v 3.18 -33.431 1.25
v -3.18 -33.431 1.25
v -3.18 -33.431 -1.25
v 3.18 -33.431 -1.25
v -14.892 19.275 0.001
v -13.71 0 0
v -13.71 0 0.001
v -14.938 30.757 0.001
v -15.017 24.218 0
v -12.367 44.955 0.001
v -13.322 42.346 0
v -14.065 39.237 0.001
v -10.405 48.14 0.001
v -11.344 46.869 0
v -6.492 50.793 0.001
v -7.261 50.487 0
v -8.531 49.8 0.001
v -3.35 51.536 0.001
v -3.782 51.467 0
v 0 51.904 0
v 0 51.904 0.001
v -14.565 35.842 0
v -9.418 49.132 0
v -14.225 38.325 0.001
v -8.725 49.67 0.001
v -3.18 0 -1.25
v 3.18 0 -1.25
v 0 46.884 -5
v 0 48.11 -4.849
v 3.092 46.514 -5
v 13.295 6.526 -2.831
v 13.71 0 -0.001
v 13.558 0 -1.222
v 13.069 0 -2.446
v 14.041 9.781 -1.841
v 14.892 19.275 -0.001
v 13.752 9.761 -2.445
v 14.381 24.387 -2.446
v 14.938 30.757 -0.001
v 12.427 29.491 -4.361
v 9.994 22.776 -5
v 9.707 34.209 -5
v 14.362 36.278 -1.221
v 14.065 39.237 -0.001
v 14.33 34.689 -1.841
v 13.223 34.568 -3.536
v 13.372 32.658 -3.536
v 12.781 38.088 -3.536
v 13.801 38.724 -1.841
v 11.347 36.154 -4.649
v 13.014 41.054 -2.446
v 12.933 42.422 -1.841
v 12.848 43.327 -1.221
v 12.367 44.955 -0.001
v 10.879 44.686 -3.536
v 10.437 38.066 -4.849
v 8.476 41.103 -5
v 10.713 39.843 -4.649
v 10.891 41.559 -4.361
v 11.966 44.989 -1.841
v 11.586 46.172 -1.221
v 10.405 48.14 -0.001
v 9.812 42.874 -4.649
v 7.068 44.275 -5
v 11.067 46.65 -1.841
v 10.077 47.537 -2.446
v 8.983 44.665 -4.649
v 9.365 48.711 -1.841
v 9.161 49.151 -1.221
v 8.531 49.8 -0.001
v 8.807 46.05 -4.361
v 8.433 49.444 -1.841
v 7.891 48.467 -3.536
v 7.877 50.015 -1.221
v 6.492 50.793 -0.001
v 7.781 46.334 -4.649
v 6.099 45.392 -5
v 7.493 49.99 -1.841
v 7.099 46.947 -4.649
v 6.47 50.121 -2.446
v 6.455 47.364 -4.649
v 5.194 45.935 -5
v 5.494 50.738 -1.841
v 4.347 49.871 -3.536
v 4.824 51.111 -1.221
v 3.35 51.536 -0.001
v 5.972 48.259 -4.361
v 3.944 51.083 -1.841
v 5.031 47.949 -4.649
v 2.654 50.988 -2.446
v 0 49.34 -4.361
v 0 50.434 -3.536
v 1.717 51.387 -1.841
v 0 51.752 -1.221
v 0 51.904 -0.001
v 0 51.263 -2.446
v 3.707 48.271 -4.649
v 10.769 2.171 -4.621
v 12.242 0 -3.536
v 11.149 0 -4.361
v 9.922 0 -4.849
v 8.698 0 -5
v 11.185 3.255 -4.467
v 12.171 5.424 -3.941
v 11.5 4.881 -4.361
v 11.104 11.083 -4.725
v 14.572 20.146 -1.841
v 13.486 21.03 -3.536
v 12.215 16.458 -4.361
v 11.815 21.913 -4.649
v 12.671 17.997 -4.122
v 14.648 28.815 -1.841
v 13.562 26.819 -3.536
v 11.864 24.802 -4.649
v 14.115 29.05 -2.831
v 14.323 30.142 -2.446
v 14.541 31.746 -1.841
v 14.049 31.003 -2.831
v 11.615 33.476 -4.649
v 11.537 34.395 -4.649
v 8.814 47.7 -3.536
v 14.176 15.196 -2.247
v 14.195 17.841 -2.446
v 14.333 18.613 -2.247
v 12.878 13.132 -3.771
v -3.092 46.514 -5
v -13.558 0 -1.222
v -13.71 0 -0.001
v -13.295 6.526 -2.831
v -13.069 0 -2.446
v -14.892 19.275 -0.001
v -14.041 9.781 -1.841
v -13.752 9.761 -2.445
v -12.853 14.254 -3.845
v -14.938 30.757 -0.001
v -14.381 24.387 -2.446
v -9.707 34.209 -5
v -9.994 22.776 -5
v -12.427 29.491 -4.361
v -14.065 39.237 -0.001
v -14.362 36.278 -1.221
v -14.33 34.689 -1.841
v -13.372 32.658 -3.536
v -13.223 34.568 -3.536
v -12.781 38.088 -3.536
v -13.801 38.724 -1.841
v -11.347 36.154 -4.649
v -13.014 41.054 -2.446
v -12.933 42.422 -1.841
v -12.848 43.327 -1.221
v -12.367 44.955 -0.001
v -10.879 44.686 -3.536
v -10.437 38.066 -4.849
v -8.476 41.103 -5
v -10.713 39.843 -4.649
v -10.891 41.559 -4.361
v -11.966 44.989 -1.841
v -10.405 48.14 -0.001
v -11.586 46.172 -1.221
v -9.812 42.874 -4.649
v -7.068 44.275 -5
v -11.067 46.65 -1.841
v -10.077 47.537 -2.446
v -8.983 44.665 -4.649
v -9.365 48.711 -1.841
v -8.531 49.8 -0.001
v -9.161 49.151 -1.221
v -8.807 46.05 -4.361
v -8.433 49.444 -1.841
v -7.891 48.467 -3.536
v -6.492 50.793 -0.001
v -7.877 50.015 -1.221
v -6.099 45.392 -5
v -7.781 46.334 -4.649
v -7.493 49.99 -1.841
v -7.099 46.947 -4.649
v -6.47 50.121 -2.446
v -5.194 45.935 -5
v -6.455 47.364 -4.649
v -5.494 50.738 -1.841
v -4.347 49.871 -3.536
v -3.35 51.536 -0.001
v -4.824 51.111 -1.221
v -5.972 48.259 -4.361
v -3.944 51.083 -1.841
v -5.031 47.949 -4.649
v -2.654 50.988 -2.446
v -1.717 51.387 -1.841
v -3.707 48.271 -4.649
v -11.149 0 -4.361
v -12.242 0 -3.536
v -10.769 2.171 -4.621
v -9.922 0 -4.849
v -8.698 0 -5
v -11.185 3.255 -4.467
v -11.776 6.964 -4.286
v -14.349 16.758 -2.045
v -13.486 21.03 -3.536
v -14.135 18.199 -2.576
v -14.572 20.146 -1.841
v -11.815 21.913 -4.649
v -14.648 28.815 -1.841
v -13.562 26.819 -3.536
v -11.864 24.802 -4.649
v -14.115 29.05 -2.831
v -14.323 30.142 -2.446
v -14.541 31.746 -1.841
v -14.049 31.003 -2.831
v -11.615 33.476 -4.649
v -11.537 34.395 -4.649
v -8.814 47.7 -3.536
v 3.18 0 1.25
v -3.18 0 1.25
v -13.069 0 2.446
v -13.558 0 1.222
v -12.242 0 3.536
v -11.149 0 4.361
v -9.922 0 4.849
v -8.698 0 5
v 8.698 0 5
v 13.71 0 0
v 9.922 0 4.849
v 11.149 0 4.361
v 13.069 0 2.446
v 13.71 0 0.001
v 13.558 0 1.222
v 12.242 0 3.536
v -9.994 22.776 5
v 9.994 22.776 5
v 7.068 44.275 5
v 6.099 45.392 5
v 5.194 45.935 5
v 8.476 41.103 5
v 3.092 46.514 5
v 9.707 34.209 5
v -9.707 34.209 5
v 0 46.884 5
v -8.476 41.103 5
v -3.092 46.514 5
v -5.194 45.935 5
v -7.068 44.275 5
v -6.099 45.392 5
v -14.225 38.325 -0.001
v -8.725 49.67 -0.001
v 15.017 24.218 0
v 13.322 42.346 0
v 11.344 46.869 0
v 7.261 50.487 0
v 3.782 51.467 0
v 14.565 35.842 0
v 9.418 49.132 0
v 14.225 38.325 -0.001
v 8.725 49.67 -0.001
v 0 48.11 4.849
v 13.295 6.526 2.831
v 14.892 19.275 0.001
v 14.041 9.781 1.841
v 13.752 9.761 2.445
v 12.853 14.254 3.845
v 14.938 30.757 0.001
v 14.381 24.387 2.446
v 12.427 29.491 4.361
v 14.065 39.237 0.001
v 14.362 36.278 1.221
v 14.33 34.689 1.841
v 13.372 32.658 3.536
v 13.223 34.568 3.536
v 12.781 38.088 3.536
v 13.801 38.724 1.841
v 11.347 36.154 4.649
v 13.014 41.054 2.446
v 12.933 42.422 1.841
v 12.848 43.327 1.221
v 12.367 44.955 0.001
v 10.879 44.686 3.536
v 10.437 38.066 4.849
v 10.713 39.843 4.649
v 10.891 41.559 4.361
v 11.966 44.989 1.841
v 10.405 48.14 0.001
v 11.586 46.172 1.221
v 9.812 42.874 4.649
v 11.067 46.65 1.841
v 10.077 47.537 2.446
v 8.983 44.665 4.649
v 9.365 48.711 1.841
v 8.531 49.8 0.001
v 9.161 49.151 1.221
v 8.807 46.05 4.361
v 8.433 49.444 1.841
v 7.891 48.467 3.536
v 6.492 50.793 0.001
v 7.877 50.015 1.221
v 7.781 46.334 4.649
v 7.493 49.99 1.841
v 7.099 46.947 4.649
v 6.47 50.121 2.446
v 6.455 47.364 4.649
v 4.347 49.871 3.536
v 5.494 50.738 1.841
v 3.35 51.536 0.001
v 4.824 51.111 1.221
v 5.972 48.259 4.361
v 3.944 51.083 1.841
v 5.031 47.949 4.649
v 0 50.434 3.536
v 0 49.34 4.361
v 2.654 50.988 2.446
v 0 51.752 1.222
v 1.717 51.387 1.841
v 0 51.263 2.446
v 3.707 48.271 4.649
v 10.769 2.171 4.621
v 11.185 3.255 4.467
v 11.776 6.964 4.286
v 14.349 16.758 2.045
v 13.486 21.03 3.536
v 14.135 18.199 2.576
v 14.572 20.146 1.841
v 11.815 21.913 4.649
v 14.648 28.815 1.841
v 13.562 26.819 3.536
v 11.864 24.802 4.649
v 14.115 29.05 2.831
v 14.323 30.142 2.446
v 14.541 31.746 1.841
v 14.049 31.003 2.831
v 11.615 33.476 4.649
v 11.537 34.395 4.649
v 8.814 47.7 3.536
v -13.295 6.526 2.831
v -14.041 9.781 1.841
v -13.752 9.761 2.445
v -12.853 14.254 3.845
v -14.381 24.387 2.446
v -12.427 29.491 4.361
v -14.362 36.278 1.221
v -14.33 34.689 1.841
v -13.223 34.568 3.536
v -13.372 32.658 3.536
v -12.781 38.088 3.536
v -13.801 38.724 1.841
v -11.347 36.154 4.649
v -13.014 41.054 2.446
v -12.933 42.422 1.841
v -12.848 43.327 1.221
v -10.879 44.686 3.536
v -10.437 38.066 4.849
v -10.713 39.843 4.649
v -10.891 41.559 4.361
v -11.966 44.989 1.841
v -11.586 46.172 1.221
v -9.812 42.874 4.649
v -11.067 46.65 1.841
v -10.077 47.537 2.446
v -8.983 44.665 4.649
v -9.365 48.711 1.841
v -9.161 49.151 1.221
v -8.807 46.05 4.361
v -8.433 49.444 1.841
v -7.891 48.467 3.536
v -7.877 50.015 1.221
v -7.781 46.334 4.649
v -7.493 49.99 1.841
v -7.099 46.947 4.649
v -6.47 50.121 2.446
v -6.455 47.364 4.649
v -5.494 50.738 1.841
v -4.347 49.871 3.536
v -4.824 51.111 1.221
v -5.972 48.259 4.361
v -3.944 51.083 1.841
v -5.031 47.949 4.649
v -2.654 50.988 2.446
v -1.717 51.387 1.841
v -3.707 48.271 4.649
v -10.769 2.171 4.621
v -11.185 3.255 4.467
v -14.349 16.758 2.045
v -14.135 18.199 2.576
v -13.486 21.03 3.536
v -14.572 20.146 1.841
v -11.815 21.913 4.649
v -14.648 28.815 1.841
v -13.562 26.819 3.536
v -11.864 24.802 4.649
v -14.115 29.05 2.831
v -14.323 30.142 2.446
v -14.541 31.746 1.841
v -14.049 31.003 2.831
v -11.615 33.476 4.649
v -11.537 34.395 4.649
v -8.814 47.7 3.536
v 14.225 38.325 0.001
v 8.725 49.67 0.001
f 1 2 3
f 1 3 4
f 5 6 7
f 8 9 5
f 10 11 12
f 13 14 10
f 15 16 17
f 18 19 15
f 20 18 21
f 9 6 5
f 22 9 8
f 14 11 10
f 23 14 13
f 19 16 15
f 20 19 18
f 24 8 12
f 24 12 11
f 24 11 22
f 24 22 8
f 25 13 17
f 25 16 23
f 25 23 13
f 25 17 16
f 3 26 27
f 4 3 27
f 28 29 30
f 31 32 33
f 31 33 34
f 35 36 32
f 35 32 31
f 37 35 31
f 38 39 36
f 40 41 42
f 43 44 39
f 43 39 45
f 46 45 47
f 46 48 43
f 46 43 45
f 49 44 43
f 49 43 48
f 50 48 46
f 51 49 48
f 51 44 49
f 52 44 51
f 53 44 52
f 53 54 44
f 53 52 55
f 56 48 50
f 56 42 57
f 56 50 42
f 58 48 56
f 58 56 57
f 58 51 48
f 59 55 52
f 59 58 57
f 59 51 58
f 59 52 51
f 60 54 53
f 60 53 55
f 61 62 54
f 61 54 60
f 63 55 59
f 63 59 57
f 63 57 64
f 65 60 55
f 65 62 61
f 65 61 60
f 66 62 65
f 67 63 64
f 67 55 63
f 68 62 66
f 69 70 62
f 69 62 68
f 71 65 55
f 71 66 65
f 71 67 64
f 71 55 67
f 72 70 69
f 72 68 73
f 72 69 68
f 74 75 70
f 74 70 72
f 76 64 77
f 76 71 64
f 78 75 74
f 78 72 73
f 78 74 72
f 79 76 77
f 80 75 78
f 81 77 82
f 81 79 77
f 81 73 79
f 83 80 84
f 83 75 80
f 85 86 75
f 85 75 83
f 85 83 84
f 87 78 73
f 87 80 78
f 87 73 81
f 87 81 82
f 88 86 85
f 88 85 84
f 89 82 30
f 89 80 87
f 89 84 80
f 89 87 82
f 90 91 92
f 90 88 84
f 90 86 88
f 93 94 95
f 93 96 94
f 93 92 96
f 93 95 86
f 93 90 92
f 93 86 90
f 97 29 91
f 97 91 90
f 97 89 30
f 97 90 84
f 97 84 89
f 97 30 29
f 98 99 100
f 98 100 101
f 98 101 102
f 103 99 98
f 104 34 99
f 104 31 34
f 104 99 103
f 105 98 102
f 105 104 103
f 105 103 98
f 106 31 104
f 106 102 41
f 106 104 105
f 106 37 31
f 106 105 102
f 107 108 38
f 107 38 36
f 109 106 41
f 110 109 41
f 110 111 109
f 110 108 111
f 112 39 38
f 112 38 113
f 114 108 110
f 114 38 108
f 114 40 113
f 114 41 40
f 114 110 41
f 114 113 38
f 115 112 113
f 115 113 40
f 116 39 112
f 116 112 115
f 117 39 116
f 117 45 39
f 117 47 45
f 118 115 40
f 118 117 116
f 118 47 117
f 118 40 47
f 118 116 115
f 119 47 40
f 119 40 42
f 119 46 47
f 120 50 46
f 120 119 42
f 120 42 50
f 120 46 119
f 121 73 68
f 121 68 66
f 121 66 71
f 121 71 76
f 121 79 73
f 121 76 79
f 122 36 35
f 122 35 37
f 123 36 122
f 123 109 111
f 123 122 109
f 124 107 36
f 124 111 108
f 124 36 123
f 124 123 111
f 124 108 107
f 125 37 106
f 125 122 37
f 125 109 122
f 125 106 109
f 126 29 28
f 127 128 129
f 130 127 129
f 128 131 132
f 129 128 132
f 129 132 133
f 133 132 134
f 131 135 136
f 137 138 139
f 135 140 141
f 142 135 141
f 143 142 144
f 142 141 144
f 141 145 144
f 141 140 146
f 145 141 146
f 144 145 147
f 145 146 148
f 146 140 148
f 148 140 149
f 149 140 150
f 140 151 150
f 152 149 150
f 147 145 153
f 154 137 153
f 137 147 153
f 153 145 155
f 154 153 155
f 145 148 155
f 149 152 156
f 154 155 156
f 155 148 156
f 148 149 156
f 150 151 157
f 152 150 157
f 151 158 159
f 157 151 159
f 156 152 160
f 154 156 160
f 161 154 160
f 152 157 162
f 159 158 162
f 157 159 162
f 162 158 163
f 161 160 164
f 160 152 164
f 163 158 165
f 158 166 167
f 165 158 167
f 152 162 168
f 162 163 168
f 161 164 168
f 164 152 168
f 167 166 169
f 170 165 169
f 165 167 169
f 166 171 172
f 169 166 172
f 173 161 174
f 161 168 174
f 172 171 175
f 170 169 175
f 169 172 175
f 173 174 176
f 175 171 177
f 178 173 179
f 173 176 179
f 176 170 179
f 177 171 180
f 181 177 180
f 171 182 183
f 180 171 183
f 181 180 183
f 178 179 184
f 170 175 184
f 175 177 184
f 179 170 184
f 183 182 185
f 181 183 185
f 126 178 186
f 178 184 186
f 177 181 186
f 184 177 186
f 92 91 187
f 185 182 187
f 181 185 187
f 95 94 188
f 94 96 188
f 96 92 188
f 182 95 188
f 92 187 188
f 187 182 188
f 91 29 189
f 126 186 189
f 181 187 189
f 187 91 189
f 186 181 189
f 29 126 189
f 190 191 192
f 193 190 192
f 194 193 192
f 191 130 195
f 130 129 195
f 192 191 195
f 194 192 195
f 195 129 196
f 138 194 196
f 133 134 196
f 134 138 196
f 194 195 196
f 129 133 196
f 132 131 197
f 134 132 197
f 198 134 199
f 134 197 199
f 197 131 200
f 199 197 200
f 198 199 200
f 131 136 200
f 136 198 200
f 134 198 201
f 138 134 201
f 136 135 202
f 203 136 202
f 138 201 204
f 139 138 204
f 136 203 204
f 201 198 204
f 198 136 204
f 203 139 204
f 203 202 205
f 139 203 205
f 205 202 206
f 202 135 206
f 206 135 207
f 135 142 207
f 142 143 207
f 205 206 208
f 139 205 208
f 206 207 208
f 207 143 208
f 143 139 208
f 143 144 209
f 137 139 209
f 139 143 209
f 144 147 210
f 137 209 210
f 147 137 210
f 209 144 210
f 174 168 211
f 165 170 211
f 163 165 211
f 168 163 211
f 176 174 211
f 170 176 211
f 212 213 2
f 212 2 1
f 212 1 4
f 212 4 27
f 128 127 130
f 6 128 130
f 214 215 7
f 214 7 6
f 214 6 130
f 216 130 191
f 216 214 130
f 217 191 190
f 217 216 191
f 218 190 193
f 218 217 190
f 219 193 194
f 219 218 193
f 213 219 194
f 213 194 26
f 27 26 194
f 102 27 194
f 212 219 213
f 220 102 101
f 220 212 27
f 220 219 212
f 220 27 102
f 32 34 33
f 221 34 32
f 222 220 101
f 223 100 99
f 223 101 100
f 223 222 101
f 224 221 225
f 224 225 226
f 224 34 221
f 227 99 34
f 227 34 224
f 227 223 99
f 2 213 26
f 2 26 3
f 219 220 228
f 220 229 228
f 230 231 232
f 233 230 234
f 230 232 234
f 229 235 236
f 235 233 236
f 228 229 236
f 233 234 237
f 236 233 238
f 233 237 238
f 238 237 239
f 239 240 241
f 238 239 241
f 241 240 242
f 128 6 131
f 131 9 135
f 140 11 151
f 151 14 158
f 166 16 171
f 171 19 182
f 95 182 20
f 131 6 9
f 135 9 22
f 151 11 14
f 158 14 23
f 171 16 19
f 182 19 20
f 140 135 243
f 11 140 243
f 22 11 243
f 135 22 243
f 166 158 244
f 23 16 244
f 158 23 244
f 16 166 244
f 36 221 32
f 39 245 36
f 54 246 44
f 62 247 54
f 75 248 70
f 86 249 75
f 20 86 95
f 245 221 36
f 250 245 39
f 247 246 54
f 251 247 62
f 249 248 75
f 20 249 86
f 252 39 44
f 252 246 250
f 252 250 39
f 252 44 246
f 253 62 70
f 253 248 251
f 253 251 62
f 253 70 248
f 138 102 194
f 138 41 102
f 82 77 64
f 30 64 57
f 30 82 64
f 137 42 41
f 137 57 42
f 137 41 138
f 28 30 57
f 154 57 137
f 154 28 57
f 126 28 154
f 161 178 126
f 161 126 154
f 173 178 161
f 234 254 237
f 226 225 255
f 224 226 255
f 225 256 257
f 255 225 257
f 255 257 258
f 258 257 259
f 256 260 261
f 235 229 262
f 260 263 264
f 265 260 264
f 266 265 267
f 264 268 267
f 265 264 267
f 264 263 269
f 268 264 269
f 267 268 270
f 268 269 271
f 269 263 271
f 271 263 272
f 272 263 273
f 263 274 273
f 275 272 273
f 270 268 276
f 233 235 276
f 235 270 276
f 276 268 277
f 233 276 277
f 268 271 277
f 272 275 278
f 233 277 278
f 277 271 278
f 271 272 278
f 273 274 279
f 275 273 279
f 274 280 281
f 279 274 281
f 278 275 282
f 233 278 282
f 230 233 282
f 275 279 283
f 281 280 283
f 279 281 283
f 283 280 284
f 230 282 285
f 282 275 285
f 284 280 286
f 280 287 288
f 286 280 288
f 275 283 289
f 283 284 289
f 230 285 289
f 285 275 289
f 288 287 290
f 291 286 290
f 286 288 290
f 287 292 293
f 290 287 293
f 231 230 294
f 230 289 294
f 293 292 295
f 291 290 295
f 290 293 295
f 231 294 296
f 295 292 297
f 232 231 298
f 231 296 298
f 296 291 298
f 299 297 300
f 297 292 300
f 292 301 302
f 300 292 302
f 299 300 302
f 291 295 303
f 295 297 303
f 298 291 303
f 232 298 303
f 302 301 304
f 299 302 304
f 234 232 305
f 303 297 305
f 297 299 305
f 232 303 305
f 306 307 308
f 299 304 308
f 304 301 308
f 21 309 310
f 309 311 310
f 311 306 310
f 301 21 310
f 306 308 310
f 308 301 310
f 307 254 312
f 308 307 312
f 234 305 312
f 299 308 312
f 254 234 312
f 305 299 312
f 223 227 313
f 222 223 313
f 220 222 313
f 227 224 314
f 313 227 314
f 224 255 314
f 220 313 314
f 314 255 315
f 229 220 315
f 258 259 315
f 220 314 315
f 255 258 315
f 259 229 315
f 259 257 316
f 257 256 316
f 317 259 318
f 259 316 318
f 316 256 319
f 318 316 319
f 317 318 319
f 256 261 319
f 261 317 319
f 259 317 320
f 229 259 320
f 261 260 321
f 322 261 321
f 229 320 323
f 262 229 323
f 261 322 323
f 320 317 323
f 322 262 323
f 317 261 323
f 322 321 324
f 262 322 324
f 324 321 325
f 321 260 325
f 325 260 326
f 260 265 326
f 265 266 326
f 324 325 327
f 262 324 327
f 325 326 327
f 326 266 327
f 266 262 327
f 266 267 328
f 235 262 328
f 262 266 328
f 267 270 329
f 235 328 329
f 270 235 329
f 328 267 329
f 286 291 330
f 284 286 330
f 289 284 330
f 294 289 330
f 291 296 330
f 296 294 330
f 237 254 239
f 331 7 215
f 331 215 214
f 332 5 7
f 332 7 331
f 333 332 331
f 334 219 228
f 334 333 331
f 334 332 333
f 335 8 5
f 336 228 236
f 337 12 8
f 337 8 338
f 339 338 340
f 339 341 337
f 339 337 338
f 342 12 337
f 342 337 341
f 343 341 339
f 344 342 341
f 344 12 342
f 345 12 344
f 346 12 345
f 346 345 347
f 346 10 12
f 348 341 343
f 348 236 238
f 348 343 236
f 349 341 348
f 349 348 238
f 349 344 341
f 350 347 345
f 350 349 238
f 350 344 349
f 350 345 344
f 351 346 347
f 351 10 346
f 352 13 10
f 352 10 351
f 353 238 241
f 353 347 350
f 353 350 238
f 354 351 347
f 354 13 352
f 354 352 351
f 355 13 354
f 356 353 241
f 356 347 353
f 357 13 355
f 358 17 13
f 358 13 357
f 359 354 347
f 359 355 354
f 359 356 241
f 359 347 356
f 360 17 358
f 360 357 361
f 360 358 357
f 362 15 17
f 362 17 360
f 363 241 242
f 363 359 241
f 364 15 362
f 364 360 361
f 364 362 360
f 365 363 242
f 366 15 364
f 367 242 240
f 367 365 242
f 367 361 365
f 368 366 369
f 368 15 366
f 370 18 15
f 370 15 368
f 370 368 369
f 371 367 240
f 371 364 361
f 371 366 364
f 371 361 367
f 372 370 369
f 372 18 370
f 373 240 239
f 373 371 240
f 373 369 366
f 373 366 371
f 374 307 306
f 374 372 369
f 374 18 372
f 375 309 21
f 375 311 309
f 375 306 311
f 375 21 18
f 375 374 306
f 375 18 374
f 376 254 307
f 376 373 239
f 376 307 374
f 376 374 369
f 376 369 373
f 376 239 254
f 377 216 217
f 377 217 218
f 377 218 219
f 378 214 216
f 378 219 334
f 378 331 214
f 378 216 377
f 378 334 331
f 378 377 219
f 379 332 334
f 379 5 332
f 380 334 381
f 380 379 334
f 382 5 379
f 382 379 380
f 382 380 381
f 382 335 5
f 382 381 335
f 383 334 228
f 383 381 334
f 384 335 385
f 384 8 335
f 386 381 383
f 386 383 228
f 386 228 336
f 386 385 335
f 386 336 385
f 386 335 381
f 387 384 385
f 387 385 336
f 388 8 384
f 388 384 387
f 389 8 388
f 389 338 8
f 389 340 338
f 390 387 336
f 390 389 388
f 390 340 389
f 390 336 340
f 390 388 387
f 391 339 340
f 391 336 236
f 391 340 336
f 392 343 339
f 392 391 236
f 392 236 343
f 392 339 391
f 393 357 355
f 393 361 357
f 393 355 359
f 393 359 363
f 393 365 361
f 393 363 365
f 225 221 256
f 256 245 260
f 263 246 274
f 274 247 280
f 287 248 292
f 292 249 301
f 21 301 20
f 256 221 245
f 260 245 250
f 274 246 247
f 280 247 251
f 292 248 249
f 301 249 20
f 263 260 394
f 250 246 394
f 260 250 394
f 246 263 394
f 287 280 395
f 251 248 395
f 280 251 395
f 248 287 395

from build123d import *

# Parameters (mm, degrees)
F1_DEPTH = 5
F2_R     = 4.999
F4_DEPTH = 1.25


# Not quite as in the source:
# - a fillet or chamfer is up to 0.001 mm smaller than in the source, because OpenCascade refuses the exact size


with BuildPart() as f1:
    # F0 (on Top) → F1 (new body, symmetric)
    with BuildSketch(Plane.XY):
        with BuildLine():
            add(Edge.make_bspline(
                [(-13.7097453699, 0), (-14.7537661126, 14.3834786699), (-16.3965507437, 37.0161302377), (-10.0715641044, 50.9942741703), (-3.1640643241, 51.6181998618), (0, 51.9039966166)],
                knots=[0, 0, 0, 0, 0.4858446106, 0.7644848677, 1, 1, 1, 1], degree=3))
            Line((-13.7097453699, 0), (13.7097453699, 0))
            add(Edge.make_bspline(
                [(13.7097453699, 0), (14.7537661126, 14.3834786699), (16.3965507437, 37.0161302377), (10.0715641044, 50.9942741703), (3.1640643241, 51.6181998618), (0, 51.9039966166)],
                knots=[0, 0, 0, 0, 0.4858446106, 0.7644848677, 1, 1, 1, 1], degree=3))
        make_face()
    extrude(amount=F1_DEPTH, both=True)

    # F2 (radius 5 in the source; OpenCascade refuses exactly that, so slightly less here)
    f2_edges = [f1.edges().sort_by_distance(p)[0] for p in [
        (-14.960078, 30.185645, 5),
        (14.960078, 30.185645, 5),
        (-14.960078, 30.185645, -5),
        (14.960078, 30.185645, -5),
    ]]
    fillet(f2_edges, radius=F2_R)

    # F3 (on Top) → F4 (join, symmetric)
    with BuildSketch(Plane.XY):
        Polygon((3.1797995325, 15.8989857882), (0, 15.8989857882), (-3.1797995325, 15.8989857882), (-3.1797995325, -33.4308445454), (0, -33.4308445454), (3.1797995325, -33.4308445454), align=None)
    extrude(amount=F4_DEPTH, both=True)


solid = f1.part
